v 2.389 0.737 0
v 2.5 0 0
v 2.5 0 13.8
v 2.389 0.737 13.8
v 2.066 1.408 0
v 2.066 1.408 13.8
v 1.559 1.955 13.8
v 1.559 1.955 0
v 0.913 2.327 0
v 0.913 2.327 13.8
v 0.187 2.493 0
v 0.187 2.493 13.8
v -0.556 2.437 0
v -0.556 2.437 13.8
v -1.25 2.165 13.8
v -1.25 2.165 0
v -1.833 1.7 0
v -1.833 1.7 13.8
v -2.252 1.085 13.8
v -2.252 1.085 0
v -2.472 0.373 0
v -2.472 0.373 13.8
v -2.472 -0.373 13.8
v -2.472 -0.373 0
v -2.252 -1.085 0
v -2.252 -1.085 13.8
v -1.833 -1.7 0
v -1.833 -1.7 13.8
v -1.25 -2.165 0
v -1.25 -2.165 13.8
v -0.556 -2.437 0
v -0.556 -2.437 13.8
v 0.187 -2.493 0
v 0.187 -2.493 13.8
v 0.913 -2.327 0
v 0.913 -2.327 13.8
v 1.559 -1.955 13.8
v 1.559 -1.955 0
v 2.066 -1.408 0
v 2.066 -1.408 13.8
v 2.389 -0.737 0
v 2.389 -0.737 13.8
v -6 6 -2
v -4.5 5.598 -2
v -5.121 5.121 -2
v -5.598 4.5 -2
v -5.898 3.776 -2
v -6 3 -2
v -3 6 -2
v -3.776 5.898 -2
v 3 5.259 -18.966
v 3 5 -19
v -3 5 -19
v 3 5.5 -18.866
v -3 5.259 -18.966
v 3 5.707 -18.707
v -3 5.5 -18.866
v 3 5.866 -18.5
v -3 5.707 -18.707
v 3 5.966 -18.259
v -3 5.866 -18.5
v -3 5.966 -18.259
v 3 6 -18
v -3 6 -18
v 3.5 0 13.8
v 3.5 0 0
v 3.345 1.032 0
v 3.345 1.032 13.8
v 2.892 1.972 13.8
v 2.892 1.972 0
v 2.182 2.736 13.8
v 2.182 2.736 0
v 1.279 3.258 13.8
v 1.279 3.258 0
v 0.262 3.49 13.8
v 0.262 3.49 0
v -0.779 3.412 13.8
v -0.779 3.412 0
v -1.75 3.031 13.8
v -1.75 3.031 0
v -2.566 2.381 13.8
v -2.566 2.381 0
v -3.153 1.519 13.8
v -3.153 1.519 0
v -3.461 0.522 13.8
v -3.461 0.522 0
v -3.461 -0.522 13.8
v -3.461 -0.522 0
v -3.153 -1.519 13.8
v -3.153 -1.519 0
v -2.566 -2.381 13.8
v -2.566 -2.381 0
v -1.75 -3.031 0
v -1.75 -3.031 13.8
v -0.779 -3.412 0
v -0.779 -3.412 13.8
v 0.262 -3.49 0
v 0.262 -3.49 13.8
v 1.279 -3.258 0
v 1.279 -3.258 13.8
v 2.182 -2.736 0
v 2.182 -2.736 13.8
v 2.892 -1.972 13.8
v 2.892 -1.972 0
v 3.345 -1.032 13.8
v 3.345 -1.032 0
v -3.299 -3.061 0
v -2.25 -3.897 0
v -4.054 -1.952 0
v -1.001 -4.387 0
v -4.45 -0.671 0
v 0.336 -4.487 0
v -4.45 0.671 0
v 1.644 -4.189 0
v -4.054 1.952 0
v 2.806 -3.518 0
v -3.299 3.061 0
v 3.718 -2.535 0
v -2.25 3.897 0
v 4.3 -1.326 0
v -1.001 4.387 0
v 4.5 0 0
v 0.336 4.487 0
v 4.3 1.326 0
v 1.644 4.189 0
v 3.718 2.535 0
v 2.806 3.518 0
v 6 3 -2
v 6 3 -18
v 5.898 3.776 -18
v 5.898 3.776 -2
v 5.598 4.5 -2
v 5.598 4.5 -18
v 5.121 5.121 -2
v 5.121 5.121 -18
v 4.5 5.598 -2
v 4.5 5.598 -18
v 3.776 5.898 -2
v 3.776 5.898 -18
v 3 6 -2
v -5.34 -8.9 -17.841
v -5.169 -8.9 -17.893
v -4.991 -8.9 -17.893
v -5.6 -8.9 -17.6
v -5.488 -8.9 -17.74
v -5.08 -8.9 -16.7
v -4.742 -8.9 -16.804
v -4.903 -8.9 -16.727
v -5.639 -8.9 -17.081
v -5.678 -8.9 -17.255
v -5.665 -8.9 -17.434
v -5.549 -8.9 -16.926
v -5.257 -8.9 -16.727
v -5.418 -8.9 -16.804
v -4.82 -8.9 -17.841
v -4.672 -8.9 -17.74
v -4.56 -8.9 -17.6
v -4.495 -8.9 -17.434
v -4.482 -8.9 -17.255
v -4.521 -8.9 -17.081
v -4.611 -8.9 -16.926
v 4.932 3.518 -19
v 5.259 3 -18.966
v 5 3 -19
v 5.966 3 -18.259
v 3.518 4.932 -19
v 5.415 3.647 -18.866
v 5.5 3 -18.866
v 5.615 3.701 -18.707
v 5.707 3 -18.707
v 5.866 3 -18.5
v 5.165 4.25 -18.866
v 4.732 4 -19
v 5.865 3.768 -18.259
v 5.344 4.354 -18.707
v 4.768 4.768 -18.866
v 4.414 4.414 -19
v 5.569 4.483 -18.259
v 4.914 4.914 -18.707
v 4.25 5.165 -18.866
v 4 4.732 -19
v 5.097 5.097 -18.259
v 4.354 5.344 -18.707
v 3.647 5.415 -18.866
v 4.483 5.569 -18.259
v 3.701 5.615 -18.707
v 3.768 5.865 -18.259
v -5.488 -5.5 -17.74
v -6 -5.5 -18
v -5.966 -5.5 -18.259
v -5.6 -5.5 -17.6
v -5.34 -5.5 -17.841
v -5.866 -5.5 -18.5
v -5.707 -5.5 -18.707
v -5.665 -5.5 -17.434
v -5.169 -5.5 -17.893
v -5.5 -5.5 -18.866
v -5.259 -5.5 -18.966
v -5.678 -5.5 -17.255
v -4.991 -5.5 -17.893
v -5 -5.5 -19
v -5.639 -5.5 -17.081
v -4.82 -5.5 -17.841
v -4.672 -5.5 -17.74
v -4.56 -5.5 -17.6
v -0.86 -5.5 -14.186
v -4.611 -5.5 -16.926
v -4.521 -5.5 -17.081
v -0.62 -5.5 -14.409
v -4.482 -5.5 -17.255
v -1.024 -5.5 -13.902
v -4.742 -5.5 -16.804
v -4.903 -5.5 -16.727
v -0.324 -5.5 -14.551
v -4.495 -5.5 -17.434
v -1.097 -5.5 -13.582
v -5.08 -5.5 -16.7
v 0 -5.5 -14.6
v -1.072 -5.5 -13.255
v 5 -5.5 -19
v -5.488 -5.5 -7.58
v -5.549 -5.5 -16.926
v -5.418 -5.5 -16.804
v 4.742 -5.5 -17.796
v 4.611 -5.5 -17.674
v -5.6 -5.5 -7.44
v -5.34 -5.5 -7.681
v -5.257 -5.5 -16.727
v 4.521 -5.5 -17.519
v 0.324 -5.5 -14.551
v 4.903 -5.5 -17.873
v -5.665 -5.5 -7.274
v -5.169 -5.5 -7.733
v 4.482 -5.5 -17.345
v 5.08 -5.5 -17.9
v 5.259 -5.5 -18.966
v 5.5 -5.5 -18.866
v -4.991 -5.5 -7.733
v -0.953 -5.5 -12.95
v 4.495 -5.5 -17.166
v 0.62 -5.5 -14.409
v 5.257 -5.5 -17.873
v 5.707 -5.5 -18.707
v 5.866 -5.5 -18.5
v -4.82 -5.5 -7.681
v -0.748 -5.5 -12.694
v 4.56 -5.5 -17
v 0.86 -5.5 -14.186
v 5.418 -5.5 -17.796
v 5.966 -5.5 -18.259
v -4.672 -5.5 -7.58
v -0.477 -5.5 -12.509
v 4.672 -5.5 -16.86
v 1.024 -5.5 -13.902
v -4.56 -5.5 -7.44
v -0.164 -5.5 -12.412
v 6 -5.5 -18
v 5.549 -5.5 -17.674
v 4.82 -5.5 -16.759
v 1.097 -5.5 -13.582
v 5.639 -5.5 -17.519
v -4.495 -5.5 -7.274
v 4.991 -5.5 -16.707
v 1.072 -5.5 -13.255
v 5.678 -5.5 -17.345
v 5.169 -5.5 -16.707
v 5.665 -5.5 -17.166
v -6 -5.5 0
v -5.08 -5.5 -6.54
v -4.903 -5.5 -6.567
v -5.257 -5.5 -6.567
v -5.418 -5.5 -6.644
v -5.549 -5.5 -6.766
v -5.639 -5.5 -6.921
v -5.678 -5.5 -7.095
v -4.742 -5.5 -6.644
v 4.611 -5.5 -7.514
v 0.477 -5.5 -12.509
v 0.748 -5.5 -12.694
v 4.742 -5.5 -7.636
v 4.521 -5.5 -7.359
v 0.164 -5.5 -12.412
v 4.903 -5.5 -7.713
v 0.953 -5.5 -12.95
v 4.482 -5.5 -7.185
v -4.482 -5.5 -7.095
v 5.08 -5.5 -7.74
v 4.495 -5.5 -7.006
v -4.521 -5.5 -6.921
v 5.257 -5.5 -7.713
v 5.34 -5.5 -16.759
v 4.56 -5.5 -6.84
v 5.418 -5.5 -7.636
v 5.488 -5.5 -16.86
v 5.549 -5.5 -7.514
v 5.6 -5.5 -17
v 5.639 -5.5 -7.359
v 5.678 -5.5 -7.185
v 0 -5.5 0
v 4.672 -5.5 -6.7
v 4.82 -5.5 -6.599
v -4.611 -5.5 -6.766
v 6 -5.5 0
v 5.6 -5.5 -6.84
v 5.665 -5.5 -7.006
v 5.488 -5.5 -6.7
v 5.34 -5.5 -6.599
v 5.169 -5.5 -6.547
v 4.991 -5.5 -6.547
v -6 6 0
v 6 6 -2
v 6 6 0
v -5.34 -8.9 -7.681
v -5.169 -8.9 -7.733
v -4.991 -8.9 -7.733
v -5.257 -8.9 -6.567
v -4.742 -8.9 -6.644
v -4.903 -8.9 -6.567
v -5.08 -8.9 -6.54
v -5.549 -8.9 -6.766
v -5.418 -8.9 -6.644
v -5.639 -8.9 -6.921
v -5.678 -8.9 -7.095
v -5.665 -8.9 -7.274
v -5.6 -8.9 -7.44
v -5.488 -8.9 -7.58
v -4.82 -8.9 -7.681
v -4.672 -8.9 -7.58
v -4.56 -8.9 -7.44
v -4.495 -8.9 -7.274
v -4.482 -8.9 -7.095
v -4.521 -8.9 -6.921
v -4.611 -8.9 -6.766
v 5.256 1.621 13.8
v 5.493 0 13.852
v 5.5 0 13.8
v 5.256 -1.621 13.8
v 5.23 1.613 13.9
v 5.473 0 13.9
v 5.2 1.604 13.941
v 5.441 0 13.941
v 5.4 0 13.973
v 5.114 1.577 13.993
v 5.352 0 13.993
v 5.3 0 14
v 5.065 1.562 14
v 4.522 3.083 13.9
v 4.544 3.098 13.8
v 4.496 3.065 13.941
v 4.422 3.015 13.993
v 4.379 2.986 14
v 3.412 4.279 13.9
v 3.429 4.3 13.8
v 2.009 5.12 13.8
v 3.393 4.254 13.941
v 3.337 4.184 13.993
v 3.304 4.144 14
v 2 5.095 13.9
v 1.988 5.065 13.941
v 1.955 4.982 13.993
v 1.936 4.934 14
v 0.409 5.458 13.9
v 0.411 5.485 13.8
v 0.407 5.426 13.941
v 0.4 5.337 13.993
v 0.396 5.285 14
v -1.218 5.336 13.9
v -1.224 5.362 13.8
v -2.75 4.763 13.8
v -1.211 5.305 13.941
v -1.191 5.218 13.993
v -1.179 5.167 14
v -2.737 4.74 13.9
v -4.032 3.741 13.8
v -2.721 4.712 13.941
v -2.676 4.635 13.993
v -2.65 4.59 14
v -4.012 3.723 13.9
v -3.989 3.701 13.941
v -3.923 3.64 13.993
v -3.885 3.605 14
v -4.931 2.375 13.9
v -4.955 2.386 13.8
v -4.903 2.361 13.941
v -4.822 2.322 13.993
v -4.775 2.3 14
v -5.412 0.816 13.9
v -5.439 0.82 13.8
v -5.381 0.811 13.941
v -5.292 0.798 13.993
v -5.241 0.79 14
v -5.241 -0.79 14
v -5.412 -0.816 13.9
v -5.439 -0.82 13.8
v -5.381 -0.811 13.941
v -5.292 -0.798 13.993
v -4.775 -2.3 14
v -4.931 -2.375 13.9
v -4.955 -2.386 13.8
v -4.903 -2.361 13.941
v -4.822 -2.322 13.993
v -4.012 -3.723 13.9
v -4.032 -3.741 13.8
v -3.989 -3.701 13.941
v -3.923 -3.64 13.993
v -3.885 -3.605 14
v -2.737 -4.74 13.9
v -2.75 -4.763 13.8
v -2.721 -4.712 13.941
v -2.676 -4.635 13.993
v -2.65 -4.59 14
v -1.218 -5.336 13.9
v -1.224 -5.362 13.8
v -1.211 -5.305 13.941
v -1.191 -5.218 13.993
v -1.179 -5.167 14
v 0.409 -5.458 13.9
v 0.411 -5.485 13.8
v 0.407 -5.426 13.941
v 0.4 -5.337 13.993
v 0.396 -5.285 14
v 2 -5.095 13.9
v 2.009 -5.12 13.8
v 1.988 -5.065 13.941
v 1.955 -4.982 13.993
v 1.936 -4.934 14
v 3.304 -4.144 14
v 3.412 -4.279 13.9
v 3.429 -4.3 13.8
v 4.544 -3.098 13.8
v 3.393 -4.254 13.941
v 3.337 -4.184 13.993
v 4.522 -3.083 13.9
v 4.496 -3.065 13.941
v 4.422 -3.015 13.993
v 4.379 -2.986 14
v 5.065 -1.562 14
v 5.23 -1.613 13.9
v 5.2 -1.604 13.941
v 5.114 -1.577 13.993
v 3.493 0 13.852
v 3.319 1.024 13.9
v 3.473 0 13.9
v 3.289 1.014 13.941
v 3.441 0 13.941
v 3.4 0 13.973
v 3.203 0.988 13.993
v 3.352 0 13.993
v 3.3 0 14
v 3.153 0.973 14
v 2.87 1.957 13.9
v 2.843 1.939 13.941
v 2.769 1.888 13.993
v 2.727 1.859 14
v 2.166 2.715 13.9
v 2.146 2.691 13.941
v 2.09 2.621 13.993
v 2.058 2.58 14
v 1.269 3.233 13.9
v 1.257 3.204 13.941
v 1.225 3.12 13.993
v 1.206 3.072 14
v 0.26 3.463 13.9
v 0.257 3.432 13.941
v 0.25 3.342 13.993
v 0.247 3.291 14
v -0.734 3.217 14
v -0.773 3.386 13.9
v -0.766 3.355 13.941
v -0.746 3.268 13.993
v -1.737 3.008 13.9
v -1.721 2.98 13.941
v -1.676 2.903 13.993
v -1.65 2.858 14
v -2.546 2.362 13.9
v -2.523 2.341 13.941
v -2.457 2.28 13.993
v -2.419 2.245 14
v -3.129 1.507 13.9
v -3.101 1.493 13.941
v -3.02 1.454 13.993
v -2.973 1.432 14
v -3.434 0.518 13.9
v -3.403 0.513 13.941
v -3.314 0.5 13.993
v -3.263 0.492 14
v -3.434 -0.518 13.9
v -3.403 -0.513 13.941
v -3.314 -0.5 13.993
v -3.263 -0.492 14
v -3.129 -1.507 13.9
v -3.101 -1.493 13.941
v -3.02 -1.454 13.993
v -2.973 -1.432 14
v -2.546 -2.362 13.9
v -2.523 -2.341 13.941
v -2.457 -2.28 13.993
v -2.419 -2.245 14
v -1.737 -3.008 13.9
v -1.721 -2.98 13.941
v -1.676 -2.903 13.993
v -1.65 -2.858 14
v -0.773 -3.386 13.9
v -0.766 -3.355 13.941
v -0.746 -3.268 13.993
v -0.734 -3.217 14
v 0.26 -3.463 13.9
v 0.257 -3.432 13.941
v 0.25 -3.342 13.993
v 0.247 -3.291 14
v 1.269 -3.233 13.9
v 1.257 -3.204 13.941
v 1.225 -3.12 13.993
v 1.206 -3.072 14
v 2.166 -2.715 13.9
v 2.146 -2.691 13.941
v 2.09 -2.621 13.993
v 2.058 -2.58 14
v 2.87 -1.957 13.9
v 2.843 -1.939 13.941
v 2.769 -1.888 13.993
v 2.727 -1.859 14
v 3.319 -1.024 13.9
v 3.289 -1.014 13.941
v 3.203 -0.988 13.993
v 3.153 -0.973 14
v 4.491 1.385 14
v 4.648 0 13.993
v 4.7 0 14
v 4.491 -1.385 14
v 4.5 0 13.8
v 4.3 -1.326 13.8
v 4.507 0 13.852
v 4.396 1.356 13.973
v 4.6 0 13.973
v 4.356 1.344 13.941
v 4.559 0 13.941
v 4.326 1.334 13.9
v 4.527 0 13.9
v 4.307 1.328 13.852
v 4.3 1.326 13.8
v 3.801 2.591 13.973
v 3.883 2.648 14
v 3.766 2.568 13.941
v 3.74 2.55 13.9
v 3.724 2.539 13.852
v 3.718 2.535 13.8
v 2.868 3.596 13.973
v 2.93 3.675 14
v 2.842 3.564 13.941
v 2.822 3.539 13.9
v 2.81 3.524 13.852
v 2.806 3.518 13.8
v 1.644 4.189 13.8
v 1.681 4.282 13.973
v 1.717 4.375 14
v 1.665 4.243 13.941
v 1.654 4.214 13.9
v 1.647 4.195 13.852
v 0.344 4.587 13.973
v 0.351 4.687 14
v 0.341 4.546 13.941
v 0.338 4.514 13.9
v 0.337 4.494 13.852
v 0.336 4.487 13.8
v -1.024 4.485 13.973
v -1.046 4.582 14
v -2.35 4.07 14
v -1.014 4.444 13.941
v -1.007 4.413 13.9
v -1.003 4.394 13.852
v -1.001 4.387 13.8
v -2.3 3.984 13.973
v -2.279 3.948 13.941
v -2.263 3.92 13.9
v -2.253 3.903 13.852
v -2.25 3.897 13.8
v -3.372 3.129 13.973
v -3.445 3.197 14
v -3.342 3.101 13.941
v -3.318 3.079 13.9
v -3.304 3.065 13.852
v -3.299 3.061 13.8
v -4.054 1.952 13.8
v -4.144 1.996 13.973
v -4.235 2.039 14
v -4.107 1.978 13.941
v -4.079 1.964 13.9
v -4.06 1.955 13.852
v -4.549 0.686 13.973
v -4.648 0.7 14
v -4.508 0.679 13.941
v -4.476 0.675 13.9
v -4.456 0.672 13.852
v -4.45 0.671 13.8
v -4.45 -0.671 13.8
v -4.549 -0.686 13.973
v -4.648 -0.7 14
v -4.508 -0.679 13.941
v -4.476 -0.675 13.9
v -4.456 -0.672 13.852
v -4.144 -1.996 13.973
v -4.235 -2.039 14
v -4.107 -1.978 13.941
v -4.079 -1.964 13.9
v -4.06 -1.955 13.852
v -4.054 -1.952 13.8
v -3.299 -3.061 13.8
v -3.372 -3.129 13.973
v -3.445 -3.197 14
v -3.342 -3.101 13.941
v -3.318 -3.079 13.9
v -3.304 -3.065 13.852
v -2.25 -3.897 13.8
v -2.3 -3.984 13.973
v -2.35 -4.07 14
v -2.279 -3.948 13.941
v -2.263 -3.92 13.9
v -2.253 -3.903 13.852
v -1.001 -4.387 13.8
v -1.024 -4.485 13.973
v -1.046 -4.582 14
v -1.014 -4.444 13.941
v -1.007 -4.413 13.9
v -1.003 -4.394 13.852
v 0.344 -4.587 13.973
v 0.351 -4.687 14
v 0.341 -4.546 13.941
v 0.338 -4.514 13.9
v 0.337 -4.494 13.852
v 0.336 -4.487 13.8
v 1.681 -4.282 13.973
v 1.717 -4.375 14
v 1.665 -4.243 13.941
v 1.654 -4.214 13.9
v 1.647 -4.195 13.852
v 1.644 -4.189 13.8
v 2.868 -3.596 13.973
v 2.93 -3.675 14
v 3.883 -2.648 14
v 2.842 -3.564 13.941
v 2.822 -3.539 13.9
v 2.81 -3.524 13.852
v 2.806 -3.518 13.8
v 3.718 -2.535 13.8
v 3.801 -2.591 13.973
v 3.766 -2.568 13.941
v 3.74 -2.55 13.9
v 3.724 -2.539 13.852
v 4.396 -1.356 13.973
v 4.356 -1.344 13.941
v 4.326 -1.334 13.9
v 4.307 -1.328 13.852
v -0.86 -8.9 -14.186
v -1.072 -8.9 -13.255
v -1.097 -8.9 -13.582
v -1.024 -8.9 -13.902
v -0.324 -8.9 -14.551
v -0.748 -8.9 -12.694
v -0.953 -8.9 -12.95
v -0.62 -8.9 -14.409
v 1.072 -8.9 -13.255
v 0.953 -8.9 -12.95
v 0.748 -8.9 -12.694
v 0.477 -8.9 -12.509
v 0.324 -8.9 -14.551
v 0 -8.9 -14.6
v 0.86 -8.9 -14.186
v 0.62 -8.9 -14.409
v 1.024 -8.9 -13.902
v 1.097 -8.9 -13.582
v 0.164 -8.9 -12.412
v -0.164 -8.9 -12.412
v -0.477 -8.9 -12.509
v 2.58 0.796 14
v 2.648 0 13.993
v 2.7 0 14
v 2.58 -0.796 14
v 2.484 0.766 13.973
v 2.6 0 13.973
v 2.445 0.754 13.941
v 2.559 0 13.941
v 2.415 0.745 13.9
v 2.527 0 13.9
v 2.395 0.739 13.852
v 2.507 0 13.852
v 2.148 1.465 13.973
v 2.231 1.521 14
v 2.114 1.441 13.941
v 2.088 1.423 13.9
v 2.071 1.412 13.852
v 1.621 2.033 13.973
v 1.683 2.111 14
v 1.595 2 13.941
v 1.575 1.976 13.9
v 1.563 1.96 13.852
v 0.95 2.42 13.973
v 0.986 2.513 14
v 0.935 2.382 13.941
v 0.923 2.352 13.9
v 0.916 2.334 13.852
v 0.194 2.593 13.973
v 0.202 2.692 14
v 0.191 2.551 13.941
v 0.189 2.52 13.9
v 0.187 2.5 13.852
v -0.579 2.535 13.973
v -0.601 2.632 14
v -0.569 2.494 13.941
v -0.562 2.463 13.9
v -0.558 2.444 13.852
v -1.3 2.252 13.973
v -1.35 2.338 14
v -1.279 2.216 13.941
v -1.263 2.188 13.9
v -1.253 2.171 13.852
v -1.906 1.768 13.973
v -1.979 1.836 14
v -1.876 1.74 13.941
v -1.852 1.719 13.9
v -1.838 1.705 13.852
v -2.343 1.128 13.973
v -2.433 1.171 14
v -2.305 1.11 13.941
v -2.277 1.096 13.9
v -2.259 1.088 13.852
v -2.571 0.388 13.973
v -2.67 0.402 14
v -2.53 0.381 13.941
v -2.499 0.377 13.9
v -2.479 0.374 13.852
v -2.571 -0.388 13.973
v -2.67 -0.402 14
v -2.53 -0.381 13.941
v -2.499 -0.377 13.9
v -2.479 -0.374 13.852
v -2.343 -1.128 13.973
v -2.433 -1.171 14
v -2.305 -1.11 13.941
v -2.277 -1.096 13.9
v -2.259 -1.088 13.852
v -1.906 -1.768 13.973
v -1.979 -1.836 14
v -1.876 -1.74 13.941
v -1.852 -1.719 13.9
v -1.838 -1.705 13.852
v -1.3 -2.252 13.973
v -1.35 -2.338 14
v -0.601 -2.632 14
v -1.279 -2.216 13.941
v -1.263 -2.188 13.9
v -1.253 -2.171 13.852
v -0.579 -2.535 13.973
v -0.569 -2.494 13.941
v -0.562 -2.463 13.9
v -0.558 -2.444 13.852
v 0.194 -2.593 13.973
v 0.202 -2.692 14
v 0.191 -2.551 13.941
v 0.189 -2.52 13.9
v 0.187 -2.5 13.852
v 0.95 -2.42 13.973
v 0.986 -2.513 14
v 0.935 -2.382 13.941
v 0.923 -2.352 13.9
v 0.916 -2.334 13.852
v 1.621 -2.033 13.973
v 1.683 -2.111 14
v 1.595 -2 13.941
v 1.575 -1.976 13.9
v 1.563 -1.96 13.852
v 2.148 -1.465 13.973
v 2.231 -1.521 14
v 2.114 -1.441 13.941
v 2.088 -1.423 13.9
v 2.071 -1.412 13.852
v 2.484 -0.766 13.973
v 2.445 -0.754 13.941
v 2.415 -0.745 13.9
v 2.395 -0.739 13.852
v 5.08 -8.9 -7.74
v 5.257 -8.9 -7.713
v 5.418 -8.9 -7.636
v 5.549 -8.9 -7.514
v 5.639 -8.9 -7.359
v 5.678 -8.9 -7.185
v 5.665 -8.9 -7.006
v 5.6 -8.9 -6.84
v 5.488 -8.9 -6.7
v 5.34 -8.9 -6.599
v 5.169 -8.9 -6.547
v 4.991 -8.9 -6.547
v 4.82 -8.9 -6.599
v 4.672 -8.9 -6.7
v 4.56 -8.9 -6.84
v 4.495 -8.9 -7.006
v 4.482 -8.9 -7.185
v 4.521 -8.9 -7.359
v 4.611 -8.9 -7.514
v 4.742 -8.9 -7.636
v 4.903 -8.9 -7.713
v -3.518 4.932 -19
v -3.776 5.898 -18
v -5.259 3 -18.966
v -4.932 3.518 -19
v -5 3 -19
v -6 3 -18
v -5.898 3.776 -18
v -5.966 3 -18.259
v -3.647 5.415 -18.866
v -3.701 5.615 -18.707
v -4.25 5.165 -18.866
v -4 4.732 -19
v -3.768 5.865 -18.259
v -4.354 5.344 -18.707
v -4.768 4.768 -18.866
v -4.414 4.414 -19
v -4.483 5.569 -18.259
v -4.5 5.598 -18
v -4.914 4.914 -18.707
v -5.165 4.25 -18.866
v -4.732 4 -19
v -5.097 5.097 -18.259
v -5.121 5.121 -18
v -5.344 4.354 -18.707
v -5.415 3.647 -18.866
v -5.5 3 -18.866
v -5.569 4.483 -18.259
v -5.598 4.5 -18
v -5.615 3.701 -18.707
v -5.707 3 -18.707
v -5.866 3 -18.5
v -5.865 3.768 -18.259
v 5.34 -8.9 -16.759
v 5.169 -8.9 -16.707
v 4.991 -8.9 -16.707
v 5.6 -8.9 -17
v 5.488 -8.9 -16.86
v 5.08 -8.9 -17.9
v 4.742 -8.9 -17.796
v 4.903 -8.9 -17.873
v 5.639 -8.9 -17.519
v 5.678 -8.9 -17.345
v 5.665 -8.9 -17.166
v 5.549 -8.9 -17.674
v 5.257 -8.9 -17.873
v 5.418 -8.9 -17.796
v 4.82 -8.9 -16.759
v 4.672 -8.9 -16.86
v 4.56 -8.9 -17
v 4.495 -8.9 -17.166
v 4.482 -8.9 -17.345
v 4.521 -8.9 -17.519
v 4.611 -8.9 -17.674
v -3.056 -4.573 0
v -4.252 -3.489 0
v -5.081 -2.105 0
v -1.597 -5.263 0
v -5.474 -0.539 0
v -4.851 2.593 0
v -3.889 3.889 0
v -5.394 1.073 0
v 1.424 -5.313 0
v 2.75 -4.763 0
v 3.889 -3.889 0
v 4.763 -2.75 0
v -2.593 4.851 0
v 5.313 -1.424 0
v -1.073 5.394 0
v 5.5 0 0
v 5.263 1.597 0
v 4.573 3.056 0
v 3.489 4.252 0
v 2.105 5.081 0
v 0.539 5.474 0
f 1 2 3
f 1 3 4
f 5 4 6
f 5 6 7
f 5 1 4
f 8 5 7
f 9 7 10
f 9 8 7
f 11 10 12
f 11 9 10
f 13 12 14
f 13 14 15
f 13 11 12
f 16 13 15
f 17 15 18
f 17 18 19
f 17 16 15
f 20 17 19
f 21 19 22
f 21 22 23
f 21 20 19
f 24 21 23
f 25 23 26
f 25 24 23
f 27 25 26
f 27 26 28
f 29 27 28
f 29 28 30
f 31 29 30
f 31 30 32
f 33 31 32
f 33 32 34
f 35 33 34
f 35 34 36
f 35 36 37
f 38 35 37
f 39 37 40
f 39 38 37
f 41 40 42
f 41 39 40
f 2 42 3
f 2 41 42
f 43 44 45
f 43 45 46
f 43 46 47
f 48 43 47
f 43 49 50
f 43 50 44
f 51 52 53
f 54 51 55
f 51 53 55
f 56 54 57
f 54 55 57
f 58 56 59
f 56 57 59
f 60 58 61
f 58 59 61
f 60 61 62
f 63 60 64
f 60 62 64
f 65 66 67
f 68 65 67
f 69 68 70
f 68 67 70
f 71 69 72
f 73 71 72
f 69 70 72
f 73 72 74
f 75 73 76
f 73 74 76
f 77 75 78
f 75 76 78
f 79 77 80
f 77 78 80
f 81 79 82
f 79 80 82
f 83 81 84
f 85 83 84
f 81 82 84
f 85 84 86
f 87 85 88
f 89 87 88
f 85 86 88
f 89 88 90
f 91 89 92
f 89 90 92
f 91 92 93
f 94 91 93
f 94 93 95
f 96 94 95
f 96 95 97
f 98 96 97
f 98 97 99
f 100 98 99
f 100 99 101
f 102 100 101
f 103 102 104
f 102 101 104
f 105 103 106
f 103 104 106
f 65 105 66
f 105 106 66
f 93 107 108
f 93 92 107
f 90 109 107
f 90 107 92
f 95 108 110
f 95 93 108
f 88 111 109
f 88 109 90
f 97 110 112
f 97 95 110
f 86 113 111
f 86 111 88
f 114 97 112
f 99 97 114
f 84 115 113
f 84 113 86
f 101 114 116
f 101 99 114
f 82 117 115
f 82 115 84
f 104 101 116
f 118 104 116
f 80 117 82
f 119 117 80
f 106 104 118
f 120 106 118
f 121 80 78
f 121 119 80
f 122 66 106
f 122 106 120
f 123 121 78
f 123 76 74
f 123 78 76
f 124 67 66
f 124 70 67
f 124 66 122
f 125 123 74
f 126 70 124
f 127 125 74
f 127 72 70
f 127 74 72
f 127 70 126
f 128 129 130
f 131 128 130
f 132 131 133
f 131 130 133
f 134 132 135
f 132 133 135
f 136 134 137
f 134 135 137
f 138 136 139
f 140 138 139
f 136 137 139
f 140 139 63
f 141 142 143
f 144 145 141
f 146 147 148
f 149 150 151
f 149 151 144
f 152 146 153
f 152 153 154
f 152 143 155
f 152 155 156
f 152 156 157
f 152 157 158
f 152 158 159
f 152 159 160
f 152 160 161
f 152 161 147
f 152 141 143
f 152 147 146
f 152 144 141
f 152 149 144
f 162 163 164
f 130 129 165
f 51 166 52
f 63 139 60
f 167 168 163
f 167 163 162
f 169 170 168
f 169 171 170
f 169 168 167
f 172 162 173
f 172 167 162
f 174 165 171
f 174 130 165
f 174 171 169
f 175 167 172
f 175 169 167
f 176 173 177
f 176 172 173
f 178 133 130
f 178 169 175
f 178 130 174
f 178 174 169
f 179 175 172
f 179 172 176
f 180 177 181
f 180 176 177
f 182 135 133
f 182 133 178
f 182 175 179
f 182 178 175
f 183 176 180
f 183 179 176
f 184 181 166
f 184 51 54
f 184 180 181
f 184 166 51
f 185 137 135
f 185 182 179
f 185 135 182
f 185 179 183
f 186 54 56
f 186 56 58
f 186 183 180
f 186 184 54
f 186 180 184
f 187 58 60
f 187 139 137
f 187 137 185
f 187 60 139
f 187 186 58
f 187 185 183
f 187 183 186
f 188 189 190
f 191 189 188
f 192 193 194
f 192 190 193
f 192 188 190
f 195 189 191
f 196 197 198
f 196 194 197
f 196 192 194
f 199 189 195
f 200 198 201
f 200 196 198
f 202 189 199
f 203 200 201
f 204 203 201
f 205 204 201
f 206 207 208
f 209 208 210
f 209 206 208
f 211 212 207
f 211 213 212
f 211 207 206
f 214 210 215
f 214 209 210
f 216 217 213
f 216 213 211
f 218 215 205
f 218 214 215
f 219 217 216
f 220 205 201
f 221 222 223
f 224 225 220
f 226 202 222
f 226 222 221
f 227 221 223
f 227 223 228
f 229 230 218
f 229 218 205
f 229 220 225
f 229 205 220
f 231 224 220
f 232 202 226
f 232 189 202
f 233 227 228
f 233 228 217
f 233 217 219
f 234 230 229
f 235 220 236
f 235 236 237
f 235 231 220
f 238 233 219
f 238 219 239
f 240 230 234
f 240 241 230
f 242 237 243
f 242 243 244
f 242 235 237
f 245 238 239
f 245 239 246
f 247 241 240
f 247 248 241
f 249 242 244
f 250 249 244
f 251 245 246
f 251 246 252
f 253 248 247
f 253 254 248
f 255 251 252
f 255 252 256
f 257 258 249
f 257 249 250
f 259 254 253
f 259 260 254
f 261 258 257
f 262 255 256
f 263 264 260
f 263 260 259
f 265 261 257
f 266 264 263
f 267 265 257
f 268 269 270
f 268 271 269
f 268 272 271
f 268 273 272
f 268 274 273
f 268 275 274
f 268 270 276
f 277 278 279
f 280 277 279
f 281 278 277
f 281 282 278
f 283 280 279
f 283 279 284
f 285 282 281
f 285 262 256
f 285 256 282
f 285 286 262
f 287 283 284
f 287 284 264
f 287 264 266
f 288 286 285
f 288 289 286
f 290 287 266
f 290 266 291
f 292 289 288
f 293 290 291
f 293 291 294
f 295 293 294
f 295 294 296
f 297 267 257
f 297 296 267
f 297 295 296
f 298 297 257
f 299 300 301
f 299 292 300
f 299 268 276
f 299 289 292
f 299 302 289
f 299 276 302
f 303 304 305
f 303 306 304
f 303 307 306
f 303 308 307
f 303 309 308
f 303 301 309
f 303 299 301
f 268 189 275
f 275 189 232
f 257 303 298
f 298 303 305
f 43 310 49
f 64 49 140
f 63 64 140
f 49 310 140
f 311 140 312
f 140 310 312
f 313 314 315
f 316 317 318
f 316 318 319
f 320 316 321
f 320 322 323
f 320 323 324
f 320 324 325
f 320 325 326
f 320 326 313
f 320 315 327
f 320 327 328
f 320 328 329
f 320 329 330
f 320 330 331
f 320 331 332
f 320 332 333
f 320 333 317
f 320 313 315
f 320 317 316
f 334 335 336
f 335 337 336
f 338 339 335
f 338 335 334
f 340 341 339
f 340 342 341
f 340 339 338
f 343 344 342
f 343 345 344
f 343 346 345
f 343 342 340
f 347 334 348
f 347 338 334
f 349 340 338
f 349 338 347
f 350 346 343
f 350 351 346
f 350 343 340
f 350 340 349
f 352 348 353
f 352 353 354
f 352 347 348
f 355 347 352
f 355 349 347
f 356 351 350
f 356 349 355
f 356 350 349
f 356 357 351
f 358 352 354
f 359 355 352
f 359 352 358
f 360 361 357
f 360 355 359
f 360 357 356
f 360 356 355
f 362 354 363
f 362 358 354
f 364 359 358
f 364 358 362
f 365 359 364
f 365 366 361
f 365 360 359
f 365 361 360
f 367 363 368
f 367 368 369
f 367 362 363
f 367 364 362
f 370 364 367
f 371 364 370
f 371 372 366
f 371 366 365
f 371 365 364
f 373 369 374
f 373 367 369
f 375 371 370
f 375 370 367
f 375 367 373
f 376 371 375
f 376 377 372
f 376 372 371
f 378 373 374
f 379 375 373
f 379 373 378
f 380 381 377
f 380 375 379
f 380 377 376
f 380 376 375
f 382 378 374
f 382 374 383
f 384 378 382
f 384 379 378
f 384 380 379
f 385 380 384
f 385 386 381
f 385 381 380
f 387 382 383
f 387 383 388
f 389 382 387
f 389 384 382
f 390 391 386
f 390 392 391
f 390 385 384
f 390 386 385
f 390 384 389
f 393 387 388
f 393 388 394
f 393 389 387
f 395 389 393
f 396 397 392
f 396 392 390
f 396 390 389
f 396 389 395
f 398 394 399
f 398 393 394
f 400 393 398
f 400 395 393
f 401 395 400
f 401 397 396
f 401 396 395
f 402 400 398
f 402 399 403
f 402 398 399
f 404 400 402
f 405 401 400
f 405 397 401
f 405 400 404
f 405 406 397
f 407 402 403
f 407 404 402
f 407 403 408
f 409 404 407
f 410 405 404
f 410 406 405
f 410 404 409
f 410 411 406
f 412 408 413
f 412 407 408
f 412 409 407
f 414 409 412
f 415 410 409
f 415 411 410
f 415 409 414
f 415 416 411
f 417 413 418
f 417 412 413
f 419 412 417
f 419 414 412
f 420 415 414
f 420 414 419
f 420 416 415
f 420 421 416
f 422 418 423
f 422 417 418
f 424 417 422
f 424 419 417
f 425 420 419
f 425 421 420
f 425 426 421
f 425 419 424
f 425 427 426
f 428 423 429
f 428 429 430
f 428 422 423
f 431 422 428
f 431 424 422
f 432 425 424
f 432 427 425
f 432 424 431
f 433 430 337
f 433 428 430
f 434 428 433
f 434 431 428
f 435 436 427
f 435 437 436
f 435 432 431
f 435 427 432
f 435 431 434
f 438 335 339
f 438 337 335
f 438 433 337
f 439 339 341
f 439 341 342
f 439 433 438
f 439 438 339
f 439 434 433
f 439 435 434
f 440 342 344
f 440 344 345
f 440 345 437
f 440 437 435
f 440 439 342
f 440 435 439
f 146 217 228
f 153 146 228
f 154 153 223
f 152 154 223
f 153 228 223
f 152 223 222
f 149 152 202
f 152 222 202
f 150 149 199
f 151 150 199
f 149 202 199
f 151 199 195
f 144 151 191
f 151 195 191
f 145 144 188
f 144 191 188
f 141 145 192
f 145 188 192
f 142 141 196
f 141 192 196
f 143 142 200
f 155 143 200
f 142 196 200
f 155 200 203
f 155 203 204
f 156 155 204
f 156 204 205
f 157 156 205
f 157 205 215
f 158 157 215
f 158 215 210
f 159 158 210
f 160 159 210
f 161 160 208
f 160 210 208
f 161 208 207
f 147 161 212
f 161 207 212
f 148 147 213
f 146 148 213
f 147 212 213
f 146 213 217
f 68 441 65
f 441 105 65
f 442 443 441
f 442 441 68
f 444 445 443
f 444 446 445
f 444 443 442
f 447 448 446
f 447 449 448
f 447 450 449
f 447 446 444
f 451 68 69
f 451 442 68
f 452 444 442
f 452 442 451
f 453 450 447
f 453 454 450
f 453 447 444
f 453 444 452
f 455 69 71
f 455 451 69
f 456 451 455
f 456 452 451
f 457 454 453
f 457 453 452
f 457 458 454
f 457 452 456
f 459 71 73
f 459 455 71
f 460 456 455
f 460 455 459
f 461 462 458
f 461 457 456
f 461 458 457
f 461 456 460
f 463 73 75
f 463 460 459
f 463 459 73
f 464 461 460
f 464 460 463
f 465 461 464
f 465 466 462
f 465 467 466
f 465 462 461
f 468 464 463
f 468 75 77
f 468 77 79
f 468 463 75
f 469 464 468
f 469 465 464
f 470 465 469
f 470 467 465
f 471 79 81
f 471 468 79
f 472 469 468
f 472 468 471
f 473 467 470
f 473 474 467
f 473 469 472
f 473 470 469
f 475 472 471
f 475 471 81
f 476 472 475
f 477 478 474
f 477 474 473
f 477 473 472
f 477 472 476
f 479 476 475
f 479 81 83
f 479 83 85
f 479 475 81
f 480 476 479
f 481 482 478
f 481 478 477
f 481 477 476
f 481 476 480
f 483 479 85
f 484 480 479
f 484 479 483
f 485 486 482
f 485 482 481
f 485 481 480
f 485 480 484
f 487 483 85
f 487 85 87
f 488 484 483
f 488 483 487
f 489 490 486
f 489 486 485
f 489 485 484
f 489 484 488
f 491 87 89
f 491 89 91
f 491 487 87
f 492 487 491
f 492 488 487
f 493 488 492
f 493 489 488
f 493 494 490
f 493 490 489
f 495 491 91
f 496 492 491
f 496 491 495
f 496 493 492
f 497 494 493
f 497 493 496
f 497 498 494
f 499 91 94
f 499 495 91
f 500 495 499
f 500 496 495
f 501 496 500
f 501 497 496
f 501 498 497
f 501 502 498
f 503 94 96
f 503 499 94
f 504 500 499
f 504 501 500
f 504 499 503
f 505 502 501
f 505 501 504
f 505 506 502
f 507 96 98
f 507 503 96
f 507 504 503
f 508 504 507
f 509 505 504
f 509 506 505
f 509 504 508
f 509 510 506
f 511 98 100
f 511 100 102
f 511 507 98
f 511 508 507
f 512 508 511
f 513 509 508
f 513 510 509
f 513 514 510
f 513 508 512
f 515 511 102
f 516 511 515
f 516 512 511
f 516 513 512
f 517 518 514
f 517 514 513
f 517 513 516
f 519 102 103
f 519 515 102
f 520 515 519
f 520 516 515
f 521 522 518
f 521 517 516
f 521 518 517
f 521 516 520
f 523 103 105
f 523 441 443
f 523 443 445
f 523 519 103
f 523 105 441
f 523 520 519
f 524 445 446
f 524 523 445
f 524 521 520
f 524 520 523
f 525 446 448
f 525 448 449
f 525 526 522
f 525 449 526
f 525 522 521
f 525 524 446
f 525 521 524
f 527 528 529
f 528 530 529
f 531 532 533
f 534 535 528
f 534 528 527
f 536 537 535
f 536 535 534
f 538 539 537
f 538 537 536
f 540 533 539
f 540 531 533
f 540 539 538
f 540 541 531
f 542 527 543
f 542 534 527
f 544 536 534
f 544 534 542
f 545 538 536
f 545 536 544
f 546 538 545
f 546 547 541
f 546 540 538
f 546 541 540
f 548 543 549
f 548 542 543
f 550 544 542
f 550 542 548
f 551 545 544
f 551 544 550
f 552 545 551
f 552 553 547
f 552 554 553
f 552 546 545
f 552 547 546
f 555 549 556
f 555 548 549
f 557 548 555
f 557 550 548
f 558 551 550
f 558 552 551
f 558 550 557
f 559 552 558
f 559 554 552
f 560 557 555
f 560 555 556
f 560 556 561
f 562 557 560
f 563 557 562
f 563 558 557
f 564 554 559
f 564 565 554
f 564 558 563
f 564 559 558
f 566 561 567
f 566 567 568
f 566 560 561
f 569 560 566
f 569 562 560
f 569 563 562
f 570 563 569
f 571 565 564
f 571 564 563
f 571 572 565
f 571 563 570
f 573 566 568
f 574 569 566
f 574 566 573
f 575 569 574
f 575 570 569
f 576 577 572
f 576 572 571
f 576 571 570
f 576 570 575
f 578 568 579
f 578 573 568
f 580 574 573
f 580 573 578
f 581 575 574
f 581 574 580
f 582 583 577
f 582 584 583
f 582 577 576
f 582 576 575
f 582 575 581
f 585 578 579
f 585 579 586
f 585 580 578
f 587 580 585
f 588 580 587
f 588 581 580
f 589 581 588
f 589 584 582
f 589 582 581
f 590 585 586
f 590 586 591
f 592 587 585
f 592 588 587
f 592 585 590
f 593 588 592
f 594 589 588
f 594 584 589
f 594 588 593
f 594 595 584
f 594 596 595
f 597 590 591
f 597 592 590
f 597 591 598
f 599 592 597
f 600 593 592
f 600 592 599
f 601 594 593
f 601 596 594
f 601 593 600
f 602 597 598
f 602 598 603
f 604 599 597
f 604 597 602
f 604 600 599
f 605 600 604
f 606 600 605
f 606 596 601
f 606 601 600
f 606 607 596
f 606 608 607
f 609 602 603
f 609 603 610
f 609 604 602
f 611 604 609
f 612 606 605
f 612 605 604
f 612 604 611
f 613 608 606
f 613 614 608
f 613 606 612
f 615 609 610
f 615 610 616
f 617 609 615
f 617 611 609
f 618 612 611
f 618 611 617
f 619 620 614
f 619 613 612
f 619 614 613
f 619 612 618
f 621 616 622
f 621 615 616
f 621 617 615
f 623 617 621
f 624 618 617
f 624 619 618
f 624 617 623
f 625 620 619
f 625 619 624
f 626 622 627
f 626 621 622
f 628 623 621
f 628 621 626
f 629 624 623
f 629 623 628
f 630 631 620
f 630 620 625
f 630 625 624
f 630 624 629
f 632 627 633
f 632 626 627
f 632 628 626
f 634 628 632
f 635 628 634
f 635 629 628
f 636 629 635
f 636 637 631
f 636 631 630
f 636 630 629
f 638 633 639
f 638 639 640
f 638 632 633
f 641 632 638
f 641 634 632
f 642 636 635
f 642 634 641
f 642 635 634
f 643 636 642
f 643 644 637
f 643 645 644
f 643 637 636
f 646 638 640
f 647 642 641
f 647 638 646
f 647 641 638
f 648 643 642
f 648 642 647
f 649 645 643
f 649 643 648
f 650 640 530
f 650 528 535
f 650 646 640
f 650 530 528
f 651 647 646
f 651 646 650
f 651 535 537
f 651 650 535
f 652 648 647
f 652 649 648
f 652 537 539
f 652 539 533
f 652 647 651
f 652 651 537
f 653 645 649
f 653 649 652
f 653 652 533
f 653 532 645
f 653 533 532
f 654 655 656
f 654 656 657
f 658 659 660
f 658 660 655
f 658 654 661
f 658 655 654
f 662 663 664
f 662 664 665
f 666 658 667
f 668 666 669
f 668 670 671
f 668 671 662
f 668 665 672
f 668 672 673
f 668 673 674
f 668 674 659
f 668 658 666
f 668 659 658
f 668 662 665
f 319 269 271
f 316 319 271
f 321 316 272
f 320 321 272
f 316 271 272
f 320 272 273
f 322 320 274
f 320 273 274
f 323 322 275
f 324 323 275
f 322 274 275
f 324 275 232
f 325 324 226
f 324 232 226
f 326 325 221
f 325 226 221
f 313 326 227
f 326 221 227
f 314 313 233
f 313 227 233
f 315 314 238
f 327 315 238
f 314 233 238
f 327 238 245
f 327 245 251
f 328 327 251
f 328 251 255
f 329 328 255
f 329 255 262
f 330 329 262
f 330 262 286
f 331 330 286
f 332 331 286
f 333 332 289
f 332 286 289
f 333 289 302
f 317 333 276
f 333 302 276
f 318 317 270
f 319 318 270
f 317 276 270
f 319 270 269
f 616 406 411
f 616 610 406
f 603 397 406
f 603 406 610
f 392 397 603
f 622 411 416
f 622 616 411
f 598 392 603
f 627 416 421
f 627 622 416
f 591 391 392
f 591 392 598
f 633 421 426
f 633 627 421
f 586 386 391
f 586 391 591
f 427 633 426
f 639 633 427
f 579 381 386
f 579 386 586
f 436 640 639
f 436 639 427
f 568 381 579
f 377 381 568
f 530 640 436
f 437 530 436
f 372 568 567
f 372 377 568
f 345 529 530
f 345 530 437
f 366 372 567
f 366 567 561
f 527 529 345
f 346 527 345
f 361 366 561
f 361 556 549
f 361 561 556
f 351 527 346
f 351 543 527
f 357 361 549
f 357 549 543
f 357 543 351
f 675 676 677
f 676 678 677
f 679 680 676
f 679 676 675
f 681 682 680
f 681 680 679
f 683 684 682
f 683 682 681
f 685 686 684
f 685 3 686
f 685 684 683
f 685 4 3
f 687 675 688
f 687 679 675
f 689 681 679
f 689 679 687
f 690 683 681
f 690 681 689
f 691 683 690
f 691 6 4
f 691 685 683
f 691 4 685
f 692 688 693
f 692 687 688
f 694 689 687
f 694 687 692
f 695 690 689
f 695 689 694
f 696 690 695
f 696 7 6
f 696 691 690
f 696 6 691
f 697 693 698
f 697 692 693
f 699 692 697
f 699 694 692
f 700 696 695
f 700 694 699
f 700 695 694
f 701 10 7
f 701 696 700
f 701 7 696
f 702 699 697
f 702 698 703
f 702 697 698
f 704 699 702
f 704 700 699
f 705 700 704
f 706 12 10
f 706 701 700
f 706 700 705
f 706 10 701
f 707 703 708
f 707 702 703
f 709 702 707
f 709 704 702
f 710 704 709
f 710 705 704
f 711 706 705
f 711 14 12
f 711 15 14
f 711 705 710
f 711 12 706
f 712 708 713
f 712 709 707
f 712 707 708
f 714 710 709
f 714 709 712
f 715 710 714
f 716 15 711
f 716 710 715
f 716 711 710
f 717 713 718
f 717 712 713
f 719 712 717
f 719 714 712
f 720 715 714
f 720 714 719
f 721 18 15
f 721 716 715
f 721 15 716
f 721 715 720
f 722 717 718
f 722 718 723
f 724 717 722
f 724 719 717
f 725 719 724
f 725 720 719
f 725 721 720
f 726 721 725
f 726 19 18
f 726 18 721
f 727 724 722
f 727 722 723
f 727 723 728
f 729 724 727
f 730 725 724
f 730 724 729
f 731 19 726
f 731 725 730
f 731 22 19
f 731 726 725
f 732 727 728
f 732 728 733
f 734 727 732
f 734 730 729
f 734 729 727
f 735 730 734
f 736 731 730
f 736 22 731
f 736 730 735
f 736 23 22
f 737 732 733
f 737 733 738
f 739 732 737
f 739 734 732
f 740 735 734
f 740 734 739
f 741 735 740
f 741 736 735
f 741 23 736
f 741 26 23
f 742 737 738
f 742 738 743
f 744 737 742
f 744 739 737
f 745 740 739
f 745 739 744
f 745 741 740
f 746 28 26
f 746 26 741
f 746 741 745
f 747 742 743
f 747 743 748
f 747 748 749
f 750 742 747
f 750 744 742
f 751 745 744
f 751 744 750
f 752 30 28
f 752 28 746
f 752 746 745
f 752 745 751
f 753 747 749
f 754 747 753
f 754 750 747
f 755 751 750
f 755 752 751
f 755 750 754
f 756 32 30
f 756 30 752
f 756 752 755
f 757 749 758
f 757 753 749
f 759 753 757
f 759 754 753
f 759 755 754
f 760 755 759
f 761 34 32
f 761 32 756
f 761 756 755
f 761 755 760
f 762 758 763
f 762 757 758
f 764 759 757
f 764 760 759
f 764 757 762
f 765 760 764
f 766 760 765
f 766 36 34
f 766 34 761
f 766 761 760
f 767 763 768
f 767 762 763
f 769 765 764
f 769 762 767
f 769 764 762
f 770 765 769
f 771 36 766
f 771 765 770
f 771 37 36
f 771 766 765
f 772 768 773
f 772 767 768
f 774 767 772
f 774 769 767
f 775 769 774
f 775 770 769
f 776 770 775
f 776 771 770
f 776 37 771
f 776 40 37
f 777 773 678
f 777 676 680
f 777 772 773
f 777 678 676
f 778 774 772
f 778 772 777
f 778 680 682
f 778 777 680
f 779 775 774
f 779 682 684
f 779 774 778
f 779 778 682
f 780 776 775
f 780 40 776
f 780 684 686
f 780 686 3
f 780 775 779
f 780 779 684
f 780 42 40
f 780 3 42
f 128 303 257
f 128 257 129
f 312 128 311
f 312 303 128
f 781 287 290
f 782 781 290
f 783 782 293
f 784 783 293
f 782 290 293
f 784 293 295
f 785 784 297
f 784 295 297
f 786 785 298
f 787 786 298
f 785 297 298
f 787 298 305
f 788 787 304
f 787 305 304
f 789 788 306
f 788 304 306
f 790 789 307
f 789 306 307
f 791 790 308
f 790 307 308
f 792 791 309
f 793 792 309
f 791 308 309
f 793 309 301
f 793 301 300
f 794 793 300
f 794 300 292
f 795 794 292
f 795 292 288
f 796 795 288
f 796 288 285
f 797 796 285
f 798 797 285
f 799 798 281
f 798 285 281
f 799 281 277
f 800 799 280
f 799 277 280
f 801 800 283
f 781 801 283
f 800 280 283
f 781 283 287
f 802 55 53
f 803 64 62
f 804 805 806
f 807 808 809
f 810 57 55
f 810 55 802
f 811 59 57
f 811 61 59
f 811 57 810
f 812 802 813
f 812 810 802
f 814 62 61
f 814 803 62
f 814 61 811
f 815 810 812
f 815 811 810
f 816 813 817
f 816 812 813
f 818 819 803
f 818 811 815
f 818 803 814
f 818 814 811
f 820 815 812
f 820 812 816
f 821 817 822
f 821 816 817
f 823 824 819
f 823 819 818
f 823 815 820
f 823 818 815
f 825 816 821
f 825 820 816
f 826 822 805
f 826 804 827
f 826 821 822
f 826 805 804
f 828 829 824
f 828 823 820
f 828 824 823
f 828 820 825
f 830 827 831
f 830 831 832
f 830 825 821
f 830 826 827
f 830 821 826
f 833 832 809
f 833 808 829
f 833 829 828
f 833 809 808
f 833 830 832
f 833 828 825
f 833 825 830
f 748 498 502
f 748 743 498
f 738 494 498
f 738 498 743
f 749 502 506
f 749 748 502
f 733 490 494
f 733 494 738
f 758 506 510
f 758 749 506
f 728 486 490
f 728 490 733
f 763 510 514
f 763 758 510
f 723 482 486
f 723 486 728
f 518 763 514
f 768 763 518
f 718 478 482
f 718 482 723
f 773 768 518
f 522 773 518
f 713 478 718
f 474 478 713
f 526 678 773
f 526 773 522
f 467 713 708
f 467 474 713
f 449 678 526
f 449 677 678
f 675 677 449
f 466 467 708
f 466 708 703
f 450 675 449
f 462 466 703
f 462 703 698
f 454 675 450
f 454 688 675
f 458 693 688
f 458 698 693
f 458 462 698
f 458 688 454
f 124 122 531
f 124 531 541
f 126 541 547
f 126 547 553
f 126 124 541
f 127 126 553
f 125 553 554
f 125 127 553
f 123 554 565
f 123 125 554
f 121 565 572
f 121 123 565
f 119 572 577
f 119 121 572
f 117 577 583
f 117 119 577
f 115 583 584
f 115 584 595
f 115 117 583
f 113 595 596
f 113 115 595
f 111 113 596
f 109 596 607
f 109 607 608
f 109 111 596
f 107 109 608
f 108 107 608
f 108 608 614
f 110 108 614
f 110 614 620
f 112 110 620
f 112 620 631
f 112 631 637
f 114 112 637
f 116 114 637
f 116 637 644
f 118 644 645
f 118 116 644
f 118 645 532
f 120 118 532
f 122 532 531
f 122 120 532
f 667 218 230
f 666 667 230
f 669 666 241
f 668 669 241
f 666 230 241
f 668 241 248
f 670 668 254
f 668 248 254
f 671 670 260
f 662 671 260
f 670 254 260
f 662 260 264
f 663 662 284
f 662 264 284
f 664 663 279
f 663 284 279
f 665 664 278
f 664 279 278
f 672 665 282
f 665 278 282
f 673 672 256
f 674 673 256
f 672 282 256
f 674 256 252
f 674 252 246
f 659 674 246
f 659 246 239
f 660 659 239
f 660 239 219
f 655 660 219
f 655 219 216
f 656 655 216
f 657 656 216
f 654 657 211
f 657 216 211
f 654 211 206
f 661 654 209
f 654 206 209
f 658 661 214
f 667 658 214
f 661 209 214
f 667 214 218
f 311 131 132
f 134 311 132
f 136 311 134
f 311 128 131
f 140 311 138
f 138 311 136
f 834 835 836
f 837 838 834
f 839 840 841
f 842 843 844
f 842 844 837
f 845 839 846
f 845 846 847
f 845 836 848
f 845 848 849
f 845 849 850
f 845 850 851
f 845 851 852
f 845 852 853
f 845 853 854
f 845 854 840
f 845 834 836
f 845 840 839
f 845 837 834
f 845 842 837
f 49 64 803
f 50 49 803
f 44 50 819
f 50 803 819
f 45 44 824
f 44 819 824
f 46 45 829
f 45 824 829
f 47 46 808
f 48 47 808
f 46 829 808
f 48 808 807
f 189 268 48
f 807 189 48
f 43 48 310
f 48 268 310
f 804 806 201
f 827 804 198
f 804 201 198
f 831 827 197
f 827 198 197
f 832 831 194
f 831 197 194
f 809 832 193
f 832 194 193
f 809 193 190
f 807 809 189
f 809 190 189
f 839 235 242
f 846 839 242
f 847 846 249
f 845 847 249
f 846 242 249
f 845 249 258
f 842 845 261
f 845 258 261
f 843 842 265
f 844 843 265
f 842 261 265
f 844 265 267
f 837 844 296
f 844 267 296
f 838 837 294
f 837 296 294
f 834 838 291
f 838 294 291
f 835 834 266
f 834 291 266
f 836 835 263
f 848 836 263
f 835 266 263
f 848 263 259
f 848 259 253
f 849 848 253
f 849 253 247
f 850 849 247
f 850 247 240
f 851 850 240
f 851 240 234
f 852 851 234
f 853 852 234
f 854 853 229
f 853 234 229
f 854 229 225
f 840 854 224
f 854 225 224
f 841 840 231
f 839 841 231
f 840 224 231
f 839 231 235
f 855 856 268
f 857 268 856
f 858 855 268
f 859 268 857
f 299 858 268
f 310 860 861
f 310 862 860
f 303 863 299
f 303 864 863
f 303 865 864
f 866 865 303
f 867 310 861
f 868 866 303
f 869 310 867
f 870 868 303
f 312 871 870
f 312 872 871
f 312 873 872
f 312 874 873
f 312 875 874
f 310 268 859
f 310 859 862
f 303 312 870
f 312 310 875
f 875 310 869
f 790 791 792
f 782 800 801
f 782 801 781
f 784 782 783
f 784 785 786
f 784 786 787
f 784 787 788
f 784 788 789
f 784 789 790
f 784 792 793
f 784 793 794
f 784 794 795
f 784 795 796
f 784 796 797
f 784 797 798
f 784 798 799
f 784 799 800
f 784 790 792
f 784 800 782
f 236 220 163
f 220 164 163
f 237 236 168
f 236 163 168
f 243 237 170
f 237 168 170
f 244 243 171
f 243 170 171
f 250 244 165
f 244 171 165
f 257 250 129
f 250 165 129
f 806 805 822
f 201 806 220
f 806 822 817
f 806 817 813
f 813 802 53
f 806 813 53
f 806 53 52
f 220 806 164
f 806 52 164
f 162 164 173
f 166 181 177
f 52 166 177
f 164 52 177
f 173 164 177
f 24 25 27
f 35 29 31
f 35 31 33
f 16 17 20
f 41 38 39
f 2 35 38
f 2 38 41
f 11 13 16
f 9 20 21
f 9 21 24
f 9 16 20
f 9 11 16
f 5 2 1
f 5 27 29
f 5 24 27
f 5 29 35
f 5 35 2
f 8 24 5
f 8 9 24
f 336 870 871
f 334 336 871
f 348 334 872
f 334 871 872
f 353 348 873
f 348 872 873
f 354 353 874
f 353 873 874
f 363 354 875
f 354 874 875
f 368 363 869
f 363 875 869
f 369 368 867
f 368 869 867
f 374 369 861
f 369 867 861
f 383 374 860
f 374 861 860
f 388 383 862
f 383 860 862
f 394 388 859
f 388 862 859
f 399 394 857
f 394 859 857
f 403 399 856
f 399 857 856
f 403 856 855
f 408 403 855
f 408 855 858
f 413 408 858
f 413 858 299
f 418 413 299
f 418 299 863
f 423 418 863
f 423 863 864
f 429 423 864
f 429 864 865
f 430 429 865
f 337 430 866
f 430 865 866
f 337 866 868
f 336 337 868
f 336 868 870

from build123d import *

# Parameters (mm, degrees)
SKETCH1_R             = 5.5
SKETCH1_R_2           = 4.5
BOSS_EXTRUDE1_DEPTH   = 14
SKETCH1_R_3           = 3.5
SKETCH1_R_4           = 2.5
BOSS_EXTRUDE1_2_DEPTH = 14
SKETCH1_3_W           = 12
SKETCH1_3_H           = 11.5
BOSS_EXTRUDE2_DEPTH   = 19
FILLET1_R             = 0.2
CUT_EXTRUDE1_DEPTH    = 17
FILLET3_R             = 1
SKETCH3_R             = 1.1
SKETCH3_R_2           = 0.6
BOSS_EXTRUDE3_DEPTH   = 3.4


with BuildPart() as part:
    # Sketch1 → Boss-Extrude1 (new body)
    with BuildSketch(Plane.XY):
        Circle(SKETCH1_R)
        Circle(SKETCH1_R_2, mode=Mode.SUBTRACT)
    extrude(amount=BOSS_EXTRUDE1_DEPTH)



with BuildPart() as body_2:
    # Sketch1 → Boss-Extrude1 2 (new body)
    with BuildSketch(Plane.XY):
        Circle(SKETCH1_R_3)
        Circle(SKETCH1_R_4, mode=Mode.SUBTRACT)
    extrude(amount=BOSS_EXTRUDE1_2_DEPTH)


with BuildPart() as part_1:
    add(part.part)

    add(body_2.part)  # Boss-Extrude2 merges body 2
    # Sketch1<3> → Boss-Extrude2 (add)
    with BuildSketch(Plane.XY):
        with Locations((0, 0.25)):
            Rectangle(SKETCH1_3_W, SKETCH1_3_H)
    extrude(amount=-BOSS_EXTRUDE2_DEPTH)

    # Fillet1
    fillet1_edges = [part_1.edges().sort_by_distance(p)[0] for p in [
        (-2.5, 0, 14),
        (-3.5, 0, 14),
        (-4.5, 0, 14),
        (-5.5, 0, 14),
    ]]
    fillet(fillet1_edges, radius=FILLET1_R)

    # Sketch2 → Cut-Extrude1 (cut)
    with BuildSketch(Plane(origin=(0, 0, -19), x_dir=(-1, 0, 0), z_dir=(0, 0, -1))):
        with BuildLine():
            Line((-8.747422549, 11), (-8.747422549, 1))
            Line((-8.747422549, 1), (-6, 1))
            Line((-6, 1), (-6, 3))
            ThreePointArc((-6, 3), (-5.121320344, 5.121320344), (-3, 6))
            Line((-3, 6), (3, 6))
            ThreePointArc((3, 6), (5.121320344, 5.121320344), (6, 3))
            Line((6, 3), (6, 1))
            Line((6, 1), (7.98389041, 1))
            Line((7.98389041, 1), (7.98389041, 11))
            Line((7.98389041, 11), (-8.747422549, 11))
        make_face()
    extrude(amount=-CUT_EXTRUDE1_DEPTH, mode=Mode.SUBTRACT)

    # Fillet3
    fillet3_edges = [part_1.edges().sort_by_distance(p)[0] for p in [
        (-6, -1.25, -19),
        (-5.121320344, 5.121320344, -19),
        (0, 6, -19),
        (5.121320344, 5.121320344, -19),
        (6, -1.25, -19),
    ]]
    fillet(fillet3_edges, radius=FILLET3_R)

    # Sketch3 → Boss-Extrude3 (add)
    with BuildSketch(Plane.XZ.offset(5.5)):
        with Locations((0, -13.5)):
            Circle(SKETCH3_R)
        with Locations((5.08, -17.3)):
            Circle(SKETCH3_R_2)
        with Locations((-5.08, -7.14)):
            Circle(SKETCH3_R_2)
        with Locations((-5.08, -17.3)):
            Circle(SKETCH3_R_2)
        with Locations((5.08, -7.14)):
            Circle(SKETCH3_R_2)
    extrude(amount=BOSS_EXTRUDE3_DEPTH)


solid = part_1.part
